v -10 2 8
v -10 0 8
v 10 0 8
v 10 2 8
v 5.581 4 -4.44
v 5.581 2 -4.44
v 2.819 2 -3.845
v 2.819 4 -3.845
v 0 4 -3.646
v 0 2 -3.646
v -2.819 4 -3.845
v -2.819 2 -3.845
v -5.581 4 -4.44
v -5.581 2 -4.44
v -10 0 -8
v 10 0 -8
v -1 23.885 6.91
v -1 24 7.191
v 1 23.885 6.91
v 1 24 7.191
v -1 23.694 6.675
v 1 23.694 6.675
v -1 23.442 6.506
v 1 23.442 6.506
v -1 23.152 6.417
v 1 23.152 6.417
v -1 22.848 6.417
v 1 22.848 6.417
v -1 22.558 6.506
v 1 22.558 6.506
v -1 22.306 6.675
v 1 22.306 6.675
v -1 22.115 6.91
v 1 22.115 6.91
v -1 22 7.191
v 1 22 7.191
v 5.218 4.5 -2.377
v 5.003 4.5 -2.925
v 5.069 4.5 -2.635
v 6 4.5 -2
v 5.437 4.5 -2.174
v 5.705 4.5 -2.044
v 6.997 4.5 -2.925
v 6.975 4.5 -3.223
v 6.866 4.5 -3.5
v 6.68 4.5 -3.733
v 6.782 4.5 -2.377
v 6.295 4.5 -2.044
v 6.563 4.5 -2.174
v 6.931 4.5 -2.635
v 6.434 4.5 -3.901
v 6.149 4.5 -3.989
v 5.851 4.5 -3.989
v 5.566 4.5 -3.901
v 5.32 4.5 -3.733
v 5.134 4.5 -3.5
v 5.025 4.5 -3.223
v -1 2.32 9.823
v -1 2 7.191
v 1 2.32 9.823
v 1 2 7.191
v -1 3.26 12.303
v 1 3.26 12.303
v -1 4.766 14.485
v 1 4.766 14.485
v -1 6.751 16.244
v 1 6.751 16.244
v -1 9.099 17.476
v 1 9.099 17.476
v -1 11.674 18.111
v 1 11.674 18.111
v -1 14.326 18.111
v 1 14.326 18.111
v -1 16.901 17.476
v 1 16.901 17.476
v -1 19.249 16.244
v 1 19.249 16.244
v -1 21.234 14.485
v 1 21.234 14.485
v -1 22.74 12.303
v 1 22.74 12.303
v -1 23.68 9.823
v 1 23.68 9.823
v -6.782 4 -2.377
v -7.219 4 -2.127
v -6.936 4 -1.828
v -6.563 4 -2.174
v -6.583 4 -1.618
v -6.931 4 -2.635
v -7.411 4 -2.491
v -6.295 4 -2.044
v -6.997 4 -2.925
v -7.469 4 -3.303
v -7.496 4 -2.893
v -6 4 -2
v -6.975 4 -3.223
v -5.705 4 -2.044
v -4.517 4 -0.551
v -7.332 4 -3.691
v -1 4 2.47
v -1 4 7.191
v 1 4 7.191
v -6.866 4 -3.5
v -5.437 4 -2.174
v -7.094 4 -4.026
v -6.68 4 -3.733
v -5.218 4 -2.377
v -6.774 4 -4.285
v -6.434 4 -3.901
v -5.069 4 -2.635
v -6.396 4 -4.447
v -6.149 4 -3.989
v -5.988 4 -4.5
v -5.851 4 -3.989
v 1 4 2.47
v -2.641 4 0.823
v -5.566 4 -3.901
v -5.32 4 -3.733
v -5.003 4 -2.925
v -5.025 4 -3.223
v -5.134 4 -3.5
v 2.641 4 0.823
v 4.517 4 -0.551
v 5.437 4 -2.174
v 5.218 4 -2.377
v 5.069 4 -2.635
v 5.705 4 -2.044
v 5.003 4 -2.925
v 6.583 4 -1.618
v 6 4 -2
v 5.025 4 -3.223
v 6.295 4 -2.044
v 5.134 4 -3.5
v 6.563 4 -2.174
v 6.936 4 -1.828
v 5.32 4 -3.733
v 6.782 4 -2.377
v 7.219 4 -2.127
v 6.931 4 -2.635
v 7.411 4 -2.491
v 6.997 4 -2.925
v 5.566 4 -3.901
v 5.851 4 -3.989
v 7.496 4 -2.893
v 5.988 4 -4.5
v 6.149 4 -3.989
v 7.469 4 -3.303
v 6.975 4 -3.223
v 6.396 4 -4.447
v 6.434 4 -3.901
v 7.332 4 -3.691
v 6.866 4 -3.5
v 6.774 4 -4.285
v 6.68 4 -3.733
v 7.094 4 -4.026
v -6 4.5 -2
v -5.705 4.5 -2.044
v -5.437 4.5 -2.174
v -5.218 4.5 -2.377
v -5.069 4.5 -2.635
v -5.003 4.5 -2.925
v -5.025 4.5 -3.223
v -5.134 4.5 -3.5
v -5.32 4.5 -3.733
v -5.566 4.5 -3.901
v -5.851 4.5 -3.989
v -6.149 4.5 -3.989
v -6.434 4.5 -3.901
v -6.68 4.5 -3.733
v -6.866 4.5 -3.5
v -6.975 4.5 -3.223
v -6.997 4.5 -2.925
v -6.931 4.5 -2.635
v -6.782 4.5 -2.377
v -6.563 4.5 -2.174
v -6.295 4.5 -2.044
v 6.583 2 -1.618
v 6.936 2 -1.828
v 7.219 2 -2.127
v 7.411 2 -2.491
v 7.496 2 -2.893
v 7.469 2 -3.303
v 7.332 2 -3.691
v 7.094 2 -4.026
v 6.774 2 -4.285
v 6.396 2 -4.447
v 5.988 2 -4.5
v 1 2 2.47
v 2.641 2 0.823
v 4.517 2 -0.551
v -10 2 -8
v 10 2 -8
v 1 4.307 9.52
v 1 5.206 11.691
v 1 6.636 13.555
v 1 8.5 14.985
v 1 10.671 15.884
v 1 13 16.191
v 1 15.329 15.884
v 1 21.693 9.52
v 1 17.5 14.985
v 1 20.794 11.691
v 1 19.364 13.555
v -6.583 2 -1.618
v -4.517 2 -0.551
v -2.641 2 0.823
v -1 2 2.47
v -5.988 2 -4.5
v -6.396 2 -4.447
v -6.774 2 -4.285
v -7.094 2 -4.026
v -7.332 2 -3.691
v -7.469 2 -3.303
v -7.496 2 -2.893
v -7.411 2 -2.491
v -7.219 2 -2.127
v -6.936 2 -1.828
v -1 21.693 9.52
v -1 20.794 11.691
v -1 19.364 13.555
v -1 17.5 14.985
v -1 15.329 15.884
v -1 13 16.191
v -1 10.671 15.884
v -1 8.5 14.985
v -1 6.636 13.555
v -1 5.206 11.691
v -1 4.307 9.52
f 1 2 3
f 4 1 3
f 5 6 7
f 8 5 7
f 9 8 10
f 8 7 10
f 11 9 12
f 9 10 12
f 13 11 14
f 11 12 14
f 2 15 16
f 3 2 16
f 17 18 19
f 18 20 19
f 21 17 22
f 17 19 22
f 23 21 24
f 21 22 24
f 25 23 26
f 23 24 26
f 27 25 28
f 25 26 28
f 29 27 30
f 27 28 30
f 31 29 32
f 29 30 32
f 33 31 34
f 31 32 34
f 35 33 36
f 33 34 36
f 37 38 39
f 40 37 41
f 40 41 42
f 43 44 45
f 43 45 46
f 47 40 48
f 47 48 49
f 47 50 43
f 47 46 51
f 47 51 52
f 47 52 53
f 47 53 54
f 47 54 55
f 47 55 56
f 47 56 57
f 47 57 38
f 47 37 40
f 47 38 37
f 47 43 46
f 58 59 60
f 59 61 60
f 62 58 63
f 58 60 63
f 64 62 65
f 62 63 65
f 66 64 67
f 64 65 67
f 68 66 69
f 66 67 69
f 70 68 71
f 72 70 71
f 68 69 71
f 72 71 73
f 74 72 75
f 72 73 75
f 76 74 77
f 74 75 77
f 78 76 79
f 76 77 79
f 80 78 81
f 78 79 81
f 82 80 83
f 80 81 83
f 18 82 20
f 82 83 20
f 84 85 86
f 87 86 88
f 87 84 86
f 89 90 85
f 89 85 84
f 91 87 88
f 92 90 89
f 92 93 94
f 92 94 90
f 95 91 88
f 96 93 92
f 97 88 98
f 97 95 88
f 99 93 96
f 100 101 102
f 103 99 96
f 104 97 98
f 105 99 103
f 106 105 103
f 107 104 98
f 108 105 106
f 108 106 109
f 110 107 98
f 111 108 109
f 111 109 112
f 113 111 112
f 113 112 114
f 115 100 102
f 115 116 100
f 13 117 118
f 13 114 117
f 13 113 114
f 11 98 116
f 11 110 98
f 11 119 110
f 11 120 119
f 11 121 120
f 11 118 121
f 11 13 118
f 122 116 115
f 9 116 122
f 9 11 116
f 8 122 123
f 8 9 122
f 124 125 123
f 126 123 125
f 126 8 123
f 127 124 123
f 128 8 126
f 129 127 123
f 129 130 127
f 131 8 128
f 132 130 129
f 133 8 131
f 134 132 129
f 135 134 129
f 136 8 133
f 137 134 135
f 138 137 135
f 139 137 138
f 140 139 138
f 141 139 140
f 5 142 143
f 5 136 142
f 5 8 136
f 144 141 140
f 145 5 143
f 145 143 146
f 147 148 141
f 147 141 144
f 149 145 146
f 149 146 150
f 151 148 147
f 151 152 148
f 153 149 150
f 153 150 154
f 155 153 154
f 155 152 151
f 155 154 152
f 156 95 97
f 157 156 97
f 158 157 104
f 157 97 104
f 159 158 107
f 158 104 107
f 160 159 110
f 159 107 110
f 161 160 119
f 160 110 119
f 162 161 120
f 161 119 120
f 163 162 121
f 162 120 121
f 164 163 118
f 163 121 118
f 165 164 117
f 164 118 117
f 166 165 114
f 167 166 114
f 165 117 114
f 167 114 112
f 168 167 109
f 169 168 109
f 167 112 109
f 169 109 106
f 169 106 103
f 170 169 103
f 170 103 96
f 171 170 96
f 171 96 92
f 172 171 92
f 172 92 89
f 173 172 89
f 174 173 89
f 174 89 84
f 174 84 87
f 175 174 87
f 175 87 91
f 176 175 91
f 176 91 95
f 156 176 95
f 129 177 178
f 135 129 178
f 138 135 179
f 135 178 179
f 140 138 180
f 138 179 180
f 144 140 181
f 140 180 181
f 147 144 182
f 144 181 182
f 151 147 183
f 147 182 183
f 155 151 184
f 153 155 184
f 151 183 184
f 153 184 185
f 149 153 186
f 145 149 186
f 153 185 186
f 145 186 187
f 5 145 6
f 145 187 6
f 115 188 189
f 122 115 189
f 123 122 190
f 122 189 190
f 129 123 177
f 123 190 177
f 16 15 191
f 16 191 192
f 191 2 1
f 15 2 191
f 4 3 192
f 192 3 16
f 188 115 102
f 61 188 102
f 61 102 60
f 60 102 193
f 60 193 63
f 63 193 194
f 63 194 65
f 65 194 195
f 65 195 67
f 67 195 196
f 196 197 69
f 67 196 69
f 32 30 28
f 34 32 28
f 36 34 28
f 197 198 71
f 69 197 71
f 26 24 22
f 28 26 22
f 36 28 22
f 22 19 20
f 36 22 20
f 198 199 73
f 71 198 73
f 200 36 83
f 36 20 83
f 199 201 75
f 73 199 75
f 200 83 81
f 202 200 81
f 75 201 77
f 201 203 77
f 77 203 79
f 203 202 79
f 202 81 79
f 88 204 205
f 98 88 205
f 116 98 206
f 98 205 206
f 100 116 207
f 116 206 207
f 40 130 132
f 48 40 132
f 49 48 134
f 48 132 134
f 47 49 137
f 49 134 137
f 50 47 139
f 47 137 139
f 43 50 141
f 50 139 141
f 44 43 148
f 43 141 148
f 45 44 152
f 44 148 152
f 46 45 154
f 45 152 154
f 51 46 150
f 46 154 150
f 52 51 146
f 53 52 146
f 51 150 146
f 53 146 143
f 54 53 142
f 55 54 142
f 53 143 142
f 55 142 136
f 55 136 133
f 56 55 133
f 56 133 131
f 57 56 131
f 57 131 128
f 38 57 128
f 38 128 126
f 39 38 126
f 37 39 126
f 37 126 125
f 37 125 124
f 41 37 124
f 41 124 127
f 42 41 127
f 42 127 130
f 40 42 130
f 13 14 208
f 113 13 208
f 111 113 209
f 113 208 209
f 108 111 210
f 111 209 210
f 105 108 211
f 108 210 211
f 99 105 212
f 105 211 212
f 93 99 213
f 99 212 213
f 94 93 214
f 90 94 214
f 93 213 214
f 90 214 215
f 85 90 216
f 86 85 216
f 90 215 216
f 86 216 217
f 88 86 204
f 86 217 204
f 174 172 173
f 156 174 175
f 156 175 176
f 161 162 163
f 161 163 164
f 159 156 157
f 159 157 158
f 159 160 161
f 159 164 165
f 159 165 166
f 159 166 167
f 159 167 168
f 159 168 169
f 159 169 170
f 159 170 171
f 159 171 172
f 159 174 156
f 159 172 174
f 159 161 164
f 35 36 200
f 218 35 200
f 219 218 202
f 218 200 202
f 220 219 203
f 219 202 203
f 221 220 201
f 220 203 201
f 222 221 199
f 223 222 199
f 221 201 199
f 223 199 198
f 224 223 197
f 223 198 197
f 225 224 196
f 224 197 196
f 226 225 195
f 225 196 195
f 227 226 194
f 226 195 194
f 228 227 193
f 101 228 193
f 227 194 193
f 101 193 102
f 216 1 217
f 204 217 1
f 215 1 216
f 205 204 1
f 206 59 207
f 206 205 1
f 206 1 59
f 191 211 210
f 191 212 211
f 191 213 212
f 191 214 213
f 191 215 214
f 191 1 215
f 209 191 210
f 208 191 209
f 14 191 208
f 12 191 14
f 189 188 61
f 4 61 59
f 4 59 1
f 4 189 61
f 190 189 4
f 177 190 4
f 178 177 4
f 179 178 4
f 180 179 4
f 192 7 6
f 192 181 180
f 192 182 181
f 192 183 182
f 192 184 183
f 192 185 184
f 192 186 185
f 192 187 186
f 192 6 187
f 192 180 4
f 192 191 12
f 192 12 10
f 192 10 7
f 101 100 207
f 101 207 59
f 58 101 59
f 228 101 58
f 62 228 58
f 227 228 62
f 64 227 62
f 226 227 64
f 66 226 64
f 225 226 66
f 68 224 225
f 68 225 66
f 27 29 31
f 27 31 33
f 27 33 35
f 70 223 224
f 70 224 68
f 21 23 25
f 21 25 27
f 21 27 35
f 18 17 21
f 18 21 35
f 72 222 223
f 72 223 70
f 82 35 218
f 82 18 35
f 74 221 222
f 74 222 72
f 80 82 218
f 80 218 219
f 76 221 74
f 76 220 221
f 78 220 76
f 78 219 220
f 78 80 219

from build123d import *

# Parameters (mm, degrees)
SKETCH1_W           = 20
SKETCH1_H           = 16
BOSS_EXTRUDE1_DEPTH = 2
SKETCH2_R           = 1
BOSS_EXTRUDE2_DEPTH = 2
BOSS_EXTRUDE3_DEPTH = 1
SKETCH10_R          = 1
BOSS_EXTRUDE4_DEPTH = 2.5


with BuildPart() as part:
    # Sketch1 → Boss-Extrude1 (new body)
    with BuildSketch(Plane(origin=(0, 0, 0), x_dir=(1, 0, 0), z_dir=(0, 1, 0))):
        Rectangle(SKETCH1_W, SKETCH1_H)
    extrude(amount=BOSS_EXTRUDE1_DEPTH)

    # Sketch2 → Boss-Extrude2 (add)
    with BuildSketch(Plane(origin=(0, 2, 0), x_dir=(1, 0, 0), z_dir=(0, 1, 0))):
        with BuildLine():
            Line((-1, -2.469823306), (-1, -7.190883186))
            Line((-1, -7.190883186), (1, -7.190883186))
            Line((1, -7.190883186), (1, -2.469823306))
            ThreePointArc((1, -2.469823306), (3.552605477, -0.099588475), (6.583085105, 1.617968249))
            ThreePointArc((6.583085105, 1.617968249), (7.413613283, 3.501694616), (5.581395349, 4.440406243))
            ThreePointArc((5.581395349, 4.440406243), (0, 3.645822822), (-5.581395349, 4.440406243))
            ThreePointArc((-5.581395349, 4.440406243), (-7.413613283, 3.501694616), (-6.583085105, 1.617968249))
            ThreePointArc((-6.583085105, 1.617968249), (-3.552605477, -0.099588475), (-1, -2.469823306))
        make_face()
        with Locations(Location((-6, 3, 0), (0, 0, 270))):
            Circle(SKETCH2_R, mode=Mode.SUBTRACT)
        with Locations(Location((6, 3, 0), (0, 0, 270))):
            Circle(SKETCH2_R, mode=Mode.SUBTRACT)
    extrude(amount=BOSS_EXTRUDE2_DEPTH)

    # Sketch8 → Boss-Extrude3 (add, symmetric)
    with BuildSketch(Plane(origin=(0, 0, 0), x_dir=(0, 0, -1), z_dir=(1, 0, 0))):
        with BuildLine():
            Line((-7.190883186, 4), (-7.190883186, 2))
            ThreePointArc((-7.190883186, 2), (-18.190883186, 13), (-7.190883186, 24))
            ThreePointArc((-7.190883186, 24), (-6.40597694, 23), (-7.190883186, 22))
            ThreePointArc((-7.190883186, 22), (-16.190883186, 13), (-7.190883186, 4))
        make_face()
    extrude(amount=BOSS_EXTRUDE3_DEPTH, both=True)

    # Sketch10 → Boss-Extrude4 (add)
    with BuildSketch(Plane(origin=(0, 2, 0), x_dir=(1, 0, 0), z_dir=(0, 1, 0))):
        with Locations(Location((6, 3, 0), (0, 0, 270))):
            Circle(SKETCH10_R)
        with Locations(Location((-6, 3, 0), (0, 0, 270))):
            Circle(SKETCH10_R)
    extrude(amount=BOSS_EXTRUDE4_DEPTH)


solid = part.part
